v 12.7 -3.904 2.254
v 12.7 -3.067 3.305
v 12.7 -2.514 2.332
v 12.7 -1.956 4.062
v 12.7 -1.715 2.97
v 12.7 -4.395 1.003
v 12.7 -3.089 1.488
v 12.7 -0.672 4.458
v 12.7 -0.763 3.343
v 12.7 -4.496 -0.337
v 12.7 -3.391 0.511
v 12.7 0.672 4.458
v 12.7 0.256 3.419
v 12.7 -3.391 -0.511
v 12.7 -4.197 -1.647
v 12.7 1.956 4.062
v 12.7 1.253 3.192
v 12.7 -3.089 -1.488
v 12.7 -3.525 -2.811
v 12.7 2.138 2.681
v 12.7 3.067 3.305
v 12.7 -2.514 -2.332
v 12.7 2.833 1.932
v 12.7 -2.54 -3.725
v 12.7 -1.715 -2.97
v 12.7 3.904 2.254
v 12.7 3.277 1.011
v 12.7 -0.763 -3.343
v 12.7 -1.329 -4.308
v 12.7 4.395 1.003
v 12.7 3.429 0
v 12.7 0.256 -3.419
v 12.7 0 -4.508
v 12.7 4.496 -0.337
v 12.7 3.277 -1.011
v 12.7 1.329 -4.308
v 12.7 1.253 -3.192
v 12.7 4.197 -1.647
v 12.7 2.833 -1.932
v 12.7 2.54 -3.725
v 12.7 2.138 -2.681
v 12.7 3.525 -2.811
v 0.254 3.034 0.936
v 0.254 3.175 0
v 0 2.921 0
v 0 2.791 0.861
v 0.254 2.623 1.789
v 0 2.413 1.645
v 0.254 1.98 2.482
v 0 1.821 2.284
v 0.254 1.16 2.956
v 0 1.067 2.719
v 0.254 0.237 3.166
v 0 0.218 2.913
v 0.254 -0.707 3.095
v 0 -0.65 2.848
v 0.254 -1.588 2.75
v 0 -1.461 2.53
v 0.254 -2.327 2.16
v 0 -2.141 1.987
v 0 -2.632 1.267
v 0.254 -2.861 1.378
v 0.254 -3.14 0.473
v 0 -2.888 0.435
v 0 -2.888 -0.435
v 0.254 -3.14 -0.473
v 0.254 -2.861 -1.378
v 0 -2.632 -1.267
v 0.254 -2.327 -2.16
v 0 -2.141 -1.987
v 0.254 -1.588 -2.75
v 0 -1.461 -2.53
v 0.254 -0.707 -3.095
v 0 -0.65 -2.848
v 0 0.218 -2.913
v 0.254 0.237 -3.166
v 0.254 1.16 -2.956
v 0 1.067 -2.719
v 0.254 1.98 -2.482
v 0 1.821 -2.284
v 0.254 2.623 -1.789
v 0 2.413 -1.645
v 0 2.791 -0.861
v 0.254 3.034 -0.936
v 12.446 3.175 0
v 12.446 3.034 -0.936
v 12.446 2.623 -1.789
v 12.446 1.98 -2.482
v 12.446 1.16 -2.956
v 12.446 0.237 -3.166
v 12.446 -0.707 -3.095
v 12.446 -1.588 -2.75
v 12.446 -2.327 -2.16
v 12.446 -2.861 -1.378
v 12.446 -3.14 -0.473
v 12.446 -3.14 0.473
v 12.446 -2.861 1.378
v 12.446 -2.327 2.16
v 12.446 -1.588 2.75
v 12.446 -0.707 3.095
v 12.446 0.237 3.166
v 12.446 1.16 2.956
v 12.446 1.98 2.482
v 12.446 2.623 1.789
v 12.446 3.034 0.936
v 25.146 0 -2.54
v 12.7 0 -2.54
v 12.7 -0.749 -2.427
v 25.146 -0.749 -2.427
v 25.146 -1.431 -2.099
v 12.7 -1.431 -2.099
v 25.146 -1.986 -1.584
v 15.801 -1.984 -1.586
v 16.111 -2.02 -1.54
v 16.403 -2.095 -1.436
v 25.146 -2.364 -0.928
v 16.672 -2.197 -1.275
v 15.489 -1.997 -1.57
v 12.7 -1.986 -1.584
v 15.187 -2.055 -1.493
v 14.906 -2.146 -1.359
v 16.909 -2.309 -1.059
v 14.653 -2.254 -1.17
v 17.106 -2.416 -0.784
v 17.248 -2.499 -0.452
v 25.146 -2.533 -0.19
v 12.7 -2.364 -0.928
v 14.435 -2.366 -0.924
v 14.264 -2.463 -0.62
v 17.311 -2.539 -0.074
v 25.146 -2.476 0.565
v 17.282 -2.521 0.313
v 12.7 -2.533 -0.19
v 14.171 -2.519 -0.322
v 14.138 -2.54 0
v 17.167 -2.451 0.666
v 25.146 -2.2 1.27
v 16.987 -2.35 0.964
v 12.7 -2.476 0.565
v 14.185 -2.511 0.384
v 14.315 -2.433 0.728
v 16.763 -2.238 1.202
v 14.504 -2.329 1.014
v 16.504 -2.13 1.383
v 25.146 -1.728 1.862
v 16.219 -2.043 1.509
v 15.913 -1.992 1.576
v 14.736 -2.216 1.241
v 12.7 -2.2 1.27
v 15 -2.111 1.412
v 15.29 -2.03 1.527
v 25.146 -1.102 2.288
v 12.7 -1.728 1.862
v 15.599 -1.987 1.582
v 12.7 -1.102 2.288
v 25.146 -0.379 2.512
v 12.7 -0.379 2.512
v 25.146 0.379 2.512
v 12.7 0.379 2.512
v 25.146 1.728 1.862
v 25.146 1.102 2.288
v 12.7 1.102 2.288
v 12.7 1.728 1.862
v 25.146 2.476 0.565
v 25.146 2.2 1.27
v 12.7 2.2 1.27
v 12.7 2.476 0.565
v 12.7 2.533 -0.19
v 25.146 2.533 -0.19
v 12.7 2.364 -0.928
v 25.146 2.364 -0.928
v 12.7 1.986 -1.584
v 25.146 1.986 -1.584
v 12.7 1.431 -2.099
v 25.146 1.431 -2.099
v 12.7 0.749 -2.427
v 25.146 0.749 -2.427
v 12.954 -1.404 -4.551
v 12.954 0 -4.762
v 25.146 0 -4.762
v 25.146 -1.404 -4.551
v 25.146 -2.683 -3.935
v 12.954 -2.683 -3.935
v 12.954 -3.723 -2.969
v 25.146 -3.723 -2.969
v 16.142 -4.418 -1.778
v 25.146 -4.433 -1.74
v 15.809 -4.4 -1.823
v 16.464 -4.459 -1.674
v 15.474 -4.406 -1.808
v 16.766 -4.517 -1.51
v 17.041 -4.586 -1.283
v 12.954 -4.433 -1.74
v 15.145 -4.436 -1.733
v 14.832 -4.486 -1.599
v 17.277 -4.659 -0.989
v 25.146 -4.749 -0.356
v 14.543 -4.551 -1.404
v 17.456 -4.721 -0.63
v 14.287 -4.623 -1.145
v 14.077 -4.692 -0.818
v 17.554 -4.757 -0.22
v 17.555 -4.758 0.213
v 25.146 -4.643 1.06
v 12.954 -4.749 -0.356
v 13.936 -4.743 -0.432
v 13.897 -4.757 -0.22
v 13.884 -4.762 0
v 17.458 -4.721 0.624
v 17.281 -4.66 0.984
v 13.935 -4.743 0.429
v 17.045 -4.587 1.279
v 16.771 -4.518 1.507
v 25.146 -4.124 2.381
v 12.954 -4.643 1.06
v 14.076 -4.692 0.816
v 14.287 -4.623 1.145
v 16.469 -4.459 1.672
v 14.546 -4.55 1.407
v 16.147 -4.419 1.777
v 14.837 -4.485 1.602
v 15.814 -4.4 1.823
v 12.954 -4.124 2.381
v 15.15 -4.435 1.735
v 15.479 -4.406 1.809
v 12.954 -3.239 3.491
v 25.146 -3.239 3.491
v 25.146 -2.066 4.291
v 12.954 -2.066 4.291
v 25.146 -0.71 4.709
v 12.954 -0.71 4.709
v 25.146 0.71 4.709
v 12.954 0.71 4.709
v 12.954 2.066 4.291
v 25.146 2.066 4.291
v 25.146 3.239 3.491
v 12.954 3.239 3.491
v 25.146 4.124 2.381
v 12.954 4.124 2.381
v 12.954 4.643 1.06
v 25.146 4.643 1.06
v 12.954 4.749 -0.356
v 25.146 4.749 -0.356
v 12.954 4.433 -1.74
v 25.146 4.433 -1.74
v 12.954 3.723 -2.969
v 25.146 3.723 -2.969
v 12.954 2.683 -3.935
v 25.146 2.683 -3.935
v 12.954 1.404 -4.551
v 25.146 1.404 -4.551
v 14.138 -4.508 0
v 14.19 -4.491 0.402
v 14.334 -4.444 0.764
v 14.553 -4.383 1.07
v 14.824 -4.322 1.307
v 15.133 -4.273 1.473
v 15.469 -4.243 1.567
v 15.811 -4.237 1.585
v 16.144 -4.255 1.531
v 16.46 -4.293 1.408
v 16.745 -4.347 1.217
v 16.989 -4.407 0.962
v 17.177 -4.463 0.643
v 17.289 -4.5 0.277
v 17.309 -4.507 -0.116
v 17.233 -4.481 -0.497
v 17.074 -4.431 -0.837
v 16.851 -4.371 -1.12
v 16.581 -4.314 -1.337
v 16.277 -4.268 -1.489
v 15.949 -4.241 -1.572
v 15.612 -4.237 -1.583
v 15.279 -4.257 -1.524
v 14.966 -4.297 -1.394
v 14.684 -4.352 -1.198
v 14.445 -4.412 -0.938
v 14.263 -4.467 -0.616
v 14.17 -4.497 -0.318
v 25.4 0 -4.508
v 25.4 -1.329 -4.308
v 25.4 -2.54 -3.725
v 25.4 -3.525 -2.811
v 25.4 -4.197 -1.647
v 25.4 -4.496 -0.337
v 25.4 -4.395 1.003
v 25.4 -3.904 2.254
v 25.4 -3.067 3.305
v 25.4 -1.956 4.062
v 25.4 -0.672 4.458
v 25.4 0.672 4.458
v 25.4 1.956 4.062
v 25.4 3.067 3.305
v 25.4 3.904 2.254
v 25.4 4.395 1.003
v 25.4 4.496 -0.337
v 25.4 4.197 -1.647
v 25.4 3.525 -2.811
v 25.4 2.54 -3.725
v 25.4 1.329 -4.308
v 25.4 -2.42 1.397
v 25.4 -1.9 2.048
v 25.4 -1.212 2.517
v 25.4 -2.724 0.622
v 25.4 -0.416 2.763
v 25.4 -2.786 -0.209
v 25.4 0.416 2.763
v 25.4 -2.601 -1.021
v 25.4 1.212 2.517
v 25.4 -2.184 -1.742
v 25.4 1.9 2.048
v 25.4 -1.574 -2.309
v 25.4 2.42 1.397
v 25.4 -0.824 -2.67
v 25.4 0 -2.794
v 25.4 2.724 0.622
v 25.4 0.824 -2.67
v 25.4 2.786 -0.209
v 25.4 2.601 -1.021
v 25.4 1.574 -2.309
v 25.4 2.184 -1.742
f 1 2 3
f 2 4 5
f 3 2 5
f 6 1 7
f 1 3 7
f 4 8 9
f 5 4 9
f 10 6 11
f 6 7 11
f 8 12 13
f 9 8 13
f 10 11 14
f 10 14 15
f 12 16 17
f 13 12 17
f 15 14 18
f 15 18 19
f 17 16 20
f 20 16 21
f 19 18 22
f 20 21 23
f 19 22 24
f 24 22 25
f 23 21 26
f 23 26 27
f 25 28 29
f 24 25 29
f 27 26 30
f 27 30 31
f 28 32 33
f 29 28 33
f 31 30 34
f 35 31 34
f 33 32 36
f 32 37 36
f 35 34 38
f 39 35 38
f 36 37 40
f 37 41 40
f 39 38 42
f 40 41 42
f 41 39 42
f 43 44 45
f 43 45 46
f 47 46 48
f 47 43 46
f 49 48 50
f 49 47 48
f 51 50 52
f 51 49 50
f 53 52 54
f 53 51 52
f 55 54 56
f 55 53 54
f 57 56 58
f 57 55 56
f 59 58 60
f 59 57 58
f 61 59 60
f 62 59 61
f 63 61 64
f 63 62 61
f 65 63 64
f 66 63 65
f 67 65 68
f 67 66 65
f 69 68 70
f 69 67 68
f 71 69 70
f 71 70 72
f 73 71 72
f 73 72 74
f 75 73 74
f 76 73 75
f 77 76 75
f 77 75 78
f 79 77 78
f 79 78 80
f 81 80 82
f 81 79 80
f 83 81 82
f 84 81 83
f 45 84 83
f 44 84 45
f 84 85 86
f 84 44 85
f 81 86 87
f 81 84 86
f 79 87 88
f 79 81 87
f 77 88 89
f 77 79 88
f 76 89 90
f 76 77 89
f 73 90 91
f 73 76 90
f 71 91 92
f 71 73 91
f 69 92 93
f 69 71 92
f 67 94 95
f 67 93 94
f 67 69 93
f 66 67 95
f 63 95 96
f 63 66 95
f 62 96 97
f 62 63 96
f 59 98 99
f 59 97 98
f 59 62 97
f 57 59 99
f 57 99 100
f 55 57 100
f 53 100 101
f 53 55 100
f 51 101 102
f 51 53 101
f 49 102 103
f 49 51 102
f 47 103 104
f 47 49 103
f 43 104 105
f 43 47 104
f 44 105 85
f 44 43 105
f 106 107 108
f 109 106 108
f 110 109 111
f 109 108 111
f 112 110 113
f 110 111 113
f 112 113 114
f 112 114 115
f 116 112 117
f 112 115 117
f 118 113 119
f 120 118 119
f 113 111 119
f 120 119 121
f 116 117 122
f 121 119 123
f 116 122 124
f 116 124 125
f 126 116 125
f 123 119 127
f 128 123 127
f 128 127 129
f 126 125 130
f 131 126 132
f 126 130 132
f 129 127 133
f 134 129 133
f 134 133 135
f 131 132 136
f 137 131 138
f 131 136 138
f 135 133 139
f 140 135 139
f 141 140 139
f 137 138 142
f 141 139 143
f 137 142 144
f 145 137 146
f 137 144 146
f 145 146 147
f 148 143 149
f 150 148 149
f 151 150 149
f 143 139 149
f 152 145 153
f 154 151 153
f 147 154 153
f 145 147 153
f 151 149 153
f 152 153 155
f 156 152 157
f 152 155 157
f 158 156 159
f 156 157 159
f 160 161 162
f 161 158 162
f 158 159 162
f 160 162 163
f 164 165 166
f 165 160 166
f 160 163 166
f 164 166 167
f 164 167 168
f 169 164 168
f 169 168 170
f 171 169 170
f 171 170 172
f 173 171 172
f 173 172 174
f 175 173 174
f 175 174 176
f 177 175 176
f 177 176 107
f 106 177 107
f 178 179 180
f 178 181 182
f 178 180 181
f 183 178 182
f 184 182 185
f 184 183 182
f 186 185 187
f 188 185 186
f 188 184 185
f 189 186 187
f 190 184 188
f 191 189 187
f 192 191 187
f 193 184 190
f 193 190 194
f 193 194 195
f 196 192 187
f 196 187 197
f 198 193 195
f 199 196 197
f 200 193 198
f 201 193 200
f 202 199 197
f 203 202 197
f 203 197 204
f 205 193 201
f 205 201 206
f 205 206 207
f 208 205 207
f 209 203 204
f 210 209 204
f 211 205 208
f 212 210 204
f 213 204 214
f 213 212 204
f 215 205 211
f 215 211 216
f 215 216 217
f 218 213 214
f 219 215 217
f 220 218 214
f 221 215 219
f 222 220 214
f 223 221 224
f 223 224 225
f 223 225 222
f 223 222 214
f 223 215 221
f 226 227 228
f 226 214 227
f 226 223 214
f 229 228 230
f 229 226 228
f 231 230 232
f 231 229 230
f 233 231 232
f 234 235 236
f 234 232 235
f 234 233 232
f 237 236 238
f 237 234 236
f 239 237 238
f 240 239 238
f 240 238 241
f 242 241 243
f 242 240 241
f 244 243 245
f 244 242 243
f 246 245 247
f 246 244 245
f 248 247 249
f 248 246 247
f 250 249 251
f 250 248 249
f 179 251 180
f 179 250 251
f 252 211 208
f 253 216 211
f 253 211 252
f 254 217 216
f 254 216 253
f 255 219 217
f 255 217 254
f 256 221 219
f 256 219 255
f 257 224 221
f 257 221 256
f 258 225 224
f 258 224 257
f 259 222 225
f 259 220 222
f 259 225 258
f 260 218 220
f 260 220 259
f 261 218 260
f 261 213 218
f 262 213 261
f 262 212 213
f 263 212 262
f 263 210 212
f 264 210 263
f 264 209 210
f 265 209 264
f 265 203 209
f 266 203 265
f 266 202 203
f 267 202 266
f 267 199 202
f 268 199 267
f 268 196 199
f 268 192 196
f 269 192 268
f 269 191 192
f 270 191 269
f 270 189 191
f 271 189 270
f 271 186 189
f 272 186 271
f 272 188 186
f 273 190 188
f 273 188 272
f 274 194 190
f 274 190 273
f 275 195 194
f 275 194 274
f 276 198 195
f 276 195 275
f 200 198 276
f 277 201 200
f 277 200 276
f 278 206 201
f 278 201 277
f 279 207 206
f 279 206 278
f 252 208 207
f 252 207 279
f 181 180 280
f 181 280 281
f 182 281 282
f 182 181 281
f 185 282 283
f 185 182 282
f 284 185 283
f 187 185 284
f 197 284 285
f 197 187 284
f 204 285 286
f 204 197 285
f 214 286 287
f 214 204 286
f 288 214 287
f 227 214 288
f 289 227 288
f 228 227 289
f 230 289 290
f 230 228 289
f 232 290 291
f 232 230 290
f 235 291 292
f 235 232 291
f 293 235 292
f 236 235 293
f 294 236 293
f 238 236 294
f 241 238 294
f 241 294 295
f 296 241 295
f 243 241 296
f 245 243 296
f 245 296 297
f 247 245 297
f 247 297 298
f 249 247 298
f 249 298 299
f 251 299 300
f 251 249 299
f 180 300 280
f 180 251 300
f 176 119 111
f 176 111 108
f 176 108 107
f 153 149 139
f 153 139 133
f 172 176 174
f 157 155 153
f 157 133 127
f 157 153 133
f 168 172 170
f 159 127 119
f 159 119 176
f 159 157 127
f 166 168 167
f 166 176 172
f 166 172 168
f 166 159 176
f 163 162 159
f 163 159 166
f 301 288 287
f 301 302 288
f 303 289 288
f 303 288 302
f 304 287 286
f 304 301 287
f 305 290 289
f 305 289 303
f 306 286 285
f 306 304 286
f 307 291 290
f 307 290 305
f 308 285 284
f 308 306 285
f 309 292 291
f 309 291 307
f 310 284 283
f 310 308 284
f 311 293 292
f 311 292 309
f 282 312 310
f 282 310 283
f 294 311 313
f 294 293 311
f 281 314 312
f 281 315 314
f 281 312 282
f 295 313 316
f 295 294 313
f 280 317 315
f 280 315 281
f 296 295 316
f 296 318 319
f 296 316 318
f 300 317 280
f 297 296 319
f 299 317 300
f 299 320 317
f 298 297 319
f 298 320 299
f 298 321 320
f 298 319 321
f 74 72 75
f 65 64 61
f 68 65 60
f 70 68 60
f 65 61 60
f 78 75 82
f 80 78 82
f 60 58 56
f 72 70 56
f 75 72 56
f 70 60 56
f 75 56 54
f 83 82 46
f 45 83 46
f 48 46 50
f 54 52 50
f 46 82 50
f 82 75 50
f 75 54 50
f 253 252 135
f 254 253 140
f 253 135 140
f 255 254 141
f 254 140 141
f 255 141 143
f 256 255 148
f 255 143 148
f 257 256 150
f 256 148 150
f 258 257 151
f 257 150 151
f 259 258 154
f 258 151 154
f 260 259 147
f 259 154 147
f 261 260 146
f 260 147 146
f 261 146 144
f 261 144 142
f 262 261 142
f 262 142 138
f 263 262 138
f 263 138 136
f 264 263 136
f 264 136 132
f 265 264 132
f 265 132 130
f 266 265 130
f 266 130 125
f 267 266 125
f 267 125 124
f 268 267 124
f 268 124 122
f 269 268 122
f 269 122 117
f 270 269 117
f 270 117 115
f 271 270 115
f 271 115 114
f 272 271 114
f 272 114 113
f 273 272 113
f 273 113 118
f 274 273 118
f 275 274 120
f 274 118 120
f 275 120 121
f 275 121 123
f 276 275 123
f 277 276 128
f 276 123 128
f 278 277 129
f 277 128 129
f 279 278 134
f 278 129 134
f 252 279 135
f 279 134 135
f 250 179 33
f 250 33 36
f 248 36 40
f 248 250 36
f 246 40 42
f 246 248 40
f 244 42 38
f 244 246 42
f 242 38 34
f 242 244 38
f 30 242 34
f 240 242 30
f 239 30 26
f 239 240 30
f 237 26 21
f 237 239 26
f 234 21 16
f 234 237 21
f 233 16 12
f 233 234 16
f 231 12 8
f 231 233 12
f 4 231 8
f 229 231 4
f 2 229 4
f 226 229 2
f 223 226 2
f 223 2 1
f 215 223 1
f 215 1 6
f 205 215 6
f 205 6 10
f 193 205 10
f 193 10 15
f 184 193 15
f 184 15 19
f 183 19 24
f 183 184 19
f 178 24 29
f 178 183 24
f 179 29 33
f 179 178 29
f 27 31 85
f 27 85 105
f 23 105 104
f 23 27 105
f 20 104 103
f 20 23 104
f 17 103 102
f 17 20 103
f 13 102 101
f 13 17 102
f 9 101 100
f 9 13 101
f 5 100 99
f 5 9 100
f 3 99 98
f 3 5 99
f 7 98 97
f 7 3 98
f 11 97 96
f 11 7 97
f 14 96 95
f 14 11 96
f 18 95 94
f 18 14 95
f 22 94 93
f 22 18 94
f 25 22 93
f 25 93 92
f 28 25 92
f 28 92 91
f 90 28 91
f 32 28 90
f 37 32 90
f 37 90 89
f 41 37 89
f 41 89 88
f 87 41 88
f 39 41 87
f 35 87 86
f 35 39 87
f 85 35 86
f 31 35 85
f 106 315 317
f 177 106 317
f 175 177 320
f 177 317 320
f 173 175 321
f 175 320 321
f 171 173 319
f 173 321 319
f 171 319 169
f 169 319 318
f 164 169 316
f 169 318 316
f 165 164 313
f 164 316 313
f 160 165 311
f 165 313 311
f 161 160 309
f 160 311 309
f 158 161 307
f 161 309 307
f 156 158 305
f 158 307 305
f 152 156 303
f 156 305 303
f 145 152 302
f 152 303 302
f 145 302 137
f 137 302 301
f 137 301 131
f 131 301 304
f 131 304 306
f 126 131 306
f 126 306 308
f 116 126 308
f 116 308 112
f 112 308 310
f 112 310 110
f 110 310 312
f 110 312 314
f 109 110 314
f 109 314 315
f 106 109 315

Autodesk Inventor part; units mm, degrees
ref_plane "YZ Plane" through (0, 0, 0) normal (1, 0, 0) x (0, 1, 0)
ref_plane "XZ Plane" through (0, 0, 0) normal (0, 1, 0) x (-1, 0, 0)
ref_plane "XY Plane" through (0, 0, 0) normal (0, 0, 1) x (1, 0, 0)
sketch "Sketch1" plane through (0, 0, 0) normal (1, 0, 0) x (0, 1, 0)
  circle A0 centre (0, 0) radius 3.175
  dimension "d0" = 6.35
extrude "Extrusion1" add sketch "Sketch1" along normal blind 12.7
sketch "Sketch2" plane through (12.7, 0, 0) normal (1, 0, 0) x (0, 0, -1)
  circle A0 centre (0, 0) radius 4.7625
  circle A1 centre (0, 0) radius 2.54
  dimension "d3" = 9.525
  dimension "d6" = 5.08
extrude "Extrusion2" add sketch "Sketch2" along normal blind 12.7
sketch "Sketch4" plane through (0, 0, 0) normal (0, 1, 0) x (-1, 0, 0)
  circle A0 centre (-15.7257, 0) radius 1.5875
  point P0 (0, 0)
  dimension "d7" = 3.175
extrude "Extrusion3" cut sketch "Sketch4" against normal up to next
chamfer "Chamfer1" distance 0.254 angle 45 6 edges at (0, -3.175, 0) (12.7, 0, 4.7625) (12.7, -3.175, 0) (17.2497, -4.7417, 0.4446) (25.4, 0, 4.7625) (25.4, 0, 2.54)
properties part number "Motor-Adapter"
